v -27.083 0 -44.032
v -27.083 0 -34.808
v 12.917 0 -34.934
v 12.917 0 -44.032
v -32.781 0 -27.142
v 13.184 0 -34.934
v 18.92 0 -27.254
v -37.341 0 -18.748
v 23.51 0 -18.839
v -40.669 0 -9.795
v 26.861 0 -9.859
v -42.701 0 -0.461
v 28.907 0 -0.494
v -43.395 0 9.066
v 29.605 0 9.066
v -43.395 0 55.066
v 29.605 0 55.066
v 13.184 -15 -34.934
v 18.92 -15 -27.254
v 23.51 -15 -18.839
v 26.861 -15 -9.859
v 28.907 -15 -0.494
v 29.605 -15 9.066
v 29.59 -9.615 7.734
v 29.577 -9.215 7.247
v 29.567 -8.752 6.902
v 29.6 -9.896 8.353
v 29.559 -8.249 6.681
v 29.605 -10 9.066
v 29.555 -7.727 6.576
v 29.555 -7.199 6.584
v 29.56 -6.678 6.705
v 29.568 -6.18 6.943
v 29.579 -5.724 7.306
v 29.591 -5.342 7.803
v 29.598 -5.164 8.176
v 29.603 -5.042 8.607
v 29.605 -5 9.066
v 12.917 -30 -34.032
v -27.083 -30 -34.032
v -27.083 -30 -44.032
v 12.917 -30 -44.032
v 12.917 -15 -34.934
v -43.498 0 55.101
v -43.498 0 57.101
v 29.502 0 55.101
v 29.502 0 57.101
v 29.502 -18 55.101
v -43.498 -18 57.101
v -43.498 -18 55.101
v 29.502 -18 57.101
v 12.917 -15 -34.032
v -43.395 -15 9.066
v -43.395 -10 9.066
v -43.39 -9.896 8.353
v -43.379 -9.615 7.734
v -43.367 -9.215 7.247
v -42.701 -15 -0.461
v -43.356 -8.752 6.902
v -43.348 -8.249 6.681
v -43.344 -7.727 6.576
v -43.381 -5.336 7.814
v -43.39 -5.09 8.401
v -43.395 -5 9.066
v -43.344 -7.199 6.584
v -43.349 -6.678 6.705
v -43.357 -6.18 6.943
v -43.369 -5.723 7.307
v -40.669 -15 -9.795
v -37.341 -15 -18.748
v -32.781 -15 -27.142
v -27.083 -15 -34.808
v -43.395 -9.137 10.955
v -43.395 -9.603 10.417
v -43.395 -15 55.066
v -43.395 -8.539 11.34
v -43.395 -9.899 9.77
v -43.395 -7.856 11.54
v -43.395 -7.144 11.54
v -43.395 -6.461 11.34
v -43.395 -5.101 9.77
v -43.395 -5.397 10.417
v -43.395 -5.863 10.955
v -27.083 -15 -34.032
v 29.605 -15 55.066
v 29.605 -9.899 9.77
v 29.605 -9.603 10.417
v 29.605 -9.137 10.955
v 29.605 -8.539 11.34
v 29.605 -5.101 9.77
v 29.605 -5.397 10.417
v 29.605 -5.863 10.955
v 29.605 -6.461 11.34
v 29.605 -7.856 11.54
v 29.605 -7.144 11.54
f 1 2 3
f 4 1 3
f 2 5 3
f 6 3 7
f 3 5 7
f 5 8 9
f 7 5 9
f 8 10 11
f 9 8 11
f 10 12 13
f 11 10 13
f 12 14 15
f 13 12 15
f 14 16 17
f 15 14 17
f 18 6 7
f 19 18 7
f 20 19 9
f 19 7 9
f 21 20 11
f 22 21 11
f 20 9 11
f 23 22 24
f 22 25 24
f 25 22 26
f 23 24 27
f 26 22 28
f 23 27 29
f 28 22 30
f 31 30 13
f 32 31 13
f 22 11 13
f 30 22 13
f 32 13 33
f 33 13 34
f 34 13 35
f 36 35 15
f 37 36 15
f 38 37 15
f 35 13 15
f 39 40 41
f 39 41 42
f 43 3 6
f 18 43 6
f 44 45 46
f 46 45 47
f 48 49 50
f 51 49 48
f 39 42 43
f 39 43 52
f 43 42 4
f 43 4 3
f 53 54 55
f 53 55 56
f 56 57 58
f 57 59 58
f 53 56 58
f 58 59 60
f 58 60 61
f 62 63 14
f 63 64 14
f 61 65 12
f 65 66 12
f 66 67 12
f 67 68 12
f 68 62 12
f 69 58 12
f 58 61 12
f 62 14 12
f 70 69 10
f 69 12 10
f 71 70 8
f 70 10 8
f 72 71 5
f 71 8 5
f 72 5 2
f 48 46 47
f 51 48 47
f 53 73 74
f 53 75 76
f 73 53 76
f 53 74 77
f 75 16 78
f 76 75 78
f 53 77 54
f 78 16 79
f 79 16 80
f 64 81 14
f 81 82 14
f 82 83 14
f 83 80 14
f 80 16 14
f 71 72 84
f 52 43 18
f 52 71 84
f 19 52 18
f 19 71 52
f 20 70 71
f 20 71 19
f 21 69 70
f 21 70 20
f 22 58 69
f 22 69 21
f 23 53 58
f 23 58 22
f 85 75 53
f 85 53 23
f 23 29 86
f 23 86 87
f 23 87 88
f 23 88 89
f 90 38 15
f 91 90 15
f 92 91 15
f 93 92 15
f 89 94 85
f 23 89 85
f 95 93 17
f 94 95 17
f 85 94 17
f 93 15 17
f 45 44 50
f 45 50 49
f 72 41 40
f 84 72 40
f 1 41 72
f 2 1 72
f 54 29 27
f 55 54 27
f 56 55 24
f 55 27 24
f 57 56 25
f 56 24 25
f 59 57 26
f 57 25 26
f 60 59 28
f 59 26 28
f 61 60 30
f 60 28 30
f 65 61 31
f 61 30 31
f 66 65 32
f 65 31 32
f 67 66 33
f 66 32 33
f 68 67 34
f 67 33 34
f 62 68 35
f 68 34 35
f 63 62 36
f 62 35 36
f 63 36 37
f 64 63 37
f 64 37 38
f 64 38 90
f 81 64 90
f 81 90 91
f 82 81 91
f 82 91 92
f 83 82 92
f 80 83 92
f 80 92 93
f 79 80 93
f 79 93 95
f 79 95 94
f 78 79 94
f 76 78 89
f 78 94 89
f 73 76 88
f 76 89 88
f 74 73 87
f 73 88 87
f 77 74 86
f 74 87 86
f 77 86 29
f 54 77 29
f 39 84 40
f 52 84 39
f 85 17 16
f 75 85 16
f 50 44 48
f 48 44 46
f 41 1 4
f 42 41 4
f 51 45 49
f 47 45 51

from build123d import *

# Parameters (mm, degrees)
F4_DEPTH = 15
F2_W     = 40
F2_H     = 10
F5_DEPTH = 30
F3_W     = 73
F3_H     = 2
F6_DEPTH = 18
F8_DEPTH = 88


with BuildPart() as f4:
    # F1 (on Front) → F4 (new body)
    with BuildSketch(Plane.XZ):
        with BuildLine():
            ThreePointArc((-43.3947380185, 9.0657884777), (-39.1345579648, -14.4084319097), (-26.9739441574, -34.9342115223))
            Line((-26.9739441574, -34.9342115223), (13.1844681203, -34.9342115223))
            ThreePointArc((13.1844681203, -34.9342115223), (25.3450819278, -14.4084319097), (29.6052619815, 9.0657884777))
            Line((29.6052619815, 9.0657884777), (29.6052619815, 53.0657884777))
            Line((29.6052619815, 53.0657884777), (29.6052619815, 55.0657884777))
            Line((29.6052619815, 55.0657884777), (-43.3947380185, 55.0657884777))
            Line((-43.3947380185, 55.0657884777), (-43.3947380185, 53.0657884777))
            Line((-43.3947380185, 53.0657884777), (-43.3947380185, 9.0657884777))
        make_face()
    extrude(amount=F4_DEPTH)

    # F2 (on Front) → F5 (join)
    with BuildSketch(Plane.XZ):
        with Locations((-7.0826117694, -39.0322719514)):
            Rectangle(F2_W, F2_H)
    extrude(amount=F5_DEPTH)

    # F7 (on face) → F8 (cut)
    with BuildSketch(Plane.YZ.offset(29.6052619815)):
        with BuildLine():
            Line((-10, 9.0657884777), (-5, 9.0657884777))
            ThreePointArc((-5, 9.0657884777), (-7.5, 11.5657884777), (-10, 9.0657884777))
        make_face()
        with BuildLine():
            ThreePointArc((-10, 9.0657884777), (-7.5, 6.5657884777), (-5, 9.0657884777))
            Line((-5, 9.0657884777), (-10, 9.0657884777))
        make_face()
    extrude(amount=-F8_DEPTH, mode=Mode.SUBTRACT)


with BuildPart() as f6:
    # F3 (on Front) → F6 (new body)
    with BuildSketch(Plane.XZ):
        with Locations((-6.9982702136, 56.1007837057)):
            Rectangle(F3_W, F3_H)
    extrude(amount=F6_DEPTH)


solid = Compound([f4.part, f6.part])
